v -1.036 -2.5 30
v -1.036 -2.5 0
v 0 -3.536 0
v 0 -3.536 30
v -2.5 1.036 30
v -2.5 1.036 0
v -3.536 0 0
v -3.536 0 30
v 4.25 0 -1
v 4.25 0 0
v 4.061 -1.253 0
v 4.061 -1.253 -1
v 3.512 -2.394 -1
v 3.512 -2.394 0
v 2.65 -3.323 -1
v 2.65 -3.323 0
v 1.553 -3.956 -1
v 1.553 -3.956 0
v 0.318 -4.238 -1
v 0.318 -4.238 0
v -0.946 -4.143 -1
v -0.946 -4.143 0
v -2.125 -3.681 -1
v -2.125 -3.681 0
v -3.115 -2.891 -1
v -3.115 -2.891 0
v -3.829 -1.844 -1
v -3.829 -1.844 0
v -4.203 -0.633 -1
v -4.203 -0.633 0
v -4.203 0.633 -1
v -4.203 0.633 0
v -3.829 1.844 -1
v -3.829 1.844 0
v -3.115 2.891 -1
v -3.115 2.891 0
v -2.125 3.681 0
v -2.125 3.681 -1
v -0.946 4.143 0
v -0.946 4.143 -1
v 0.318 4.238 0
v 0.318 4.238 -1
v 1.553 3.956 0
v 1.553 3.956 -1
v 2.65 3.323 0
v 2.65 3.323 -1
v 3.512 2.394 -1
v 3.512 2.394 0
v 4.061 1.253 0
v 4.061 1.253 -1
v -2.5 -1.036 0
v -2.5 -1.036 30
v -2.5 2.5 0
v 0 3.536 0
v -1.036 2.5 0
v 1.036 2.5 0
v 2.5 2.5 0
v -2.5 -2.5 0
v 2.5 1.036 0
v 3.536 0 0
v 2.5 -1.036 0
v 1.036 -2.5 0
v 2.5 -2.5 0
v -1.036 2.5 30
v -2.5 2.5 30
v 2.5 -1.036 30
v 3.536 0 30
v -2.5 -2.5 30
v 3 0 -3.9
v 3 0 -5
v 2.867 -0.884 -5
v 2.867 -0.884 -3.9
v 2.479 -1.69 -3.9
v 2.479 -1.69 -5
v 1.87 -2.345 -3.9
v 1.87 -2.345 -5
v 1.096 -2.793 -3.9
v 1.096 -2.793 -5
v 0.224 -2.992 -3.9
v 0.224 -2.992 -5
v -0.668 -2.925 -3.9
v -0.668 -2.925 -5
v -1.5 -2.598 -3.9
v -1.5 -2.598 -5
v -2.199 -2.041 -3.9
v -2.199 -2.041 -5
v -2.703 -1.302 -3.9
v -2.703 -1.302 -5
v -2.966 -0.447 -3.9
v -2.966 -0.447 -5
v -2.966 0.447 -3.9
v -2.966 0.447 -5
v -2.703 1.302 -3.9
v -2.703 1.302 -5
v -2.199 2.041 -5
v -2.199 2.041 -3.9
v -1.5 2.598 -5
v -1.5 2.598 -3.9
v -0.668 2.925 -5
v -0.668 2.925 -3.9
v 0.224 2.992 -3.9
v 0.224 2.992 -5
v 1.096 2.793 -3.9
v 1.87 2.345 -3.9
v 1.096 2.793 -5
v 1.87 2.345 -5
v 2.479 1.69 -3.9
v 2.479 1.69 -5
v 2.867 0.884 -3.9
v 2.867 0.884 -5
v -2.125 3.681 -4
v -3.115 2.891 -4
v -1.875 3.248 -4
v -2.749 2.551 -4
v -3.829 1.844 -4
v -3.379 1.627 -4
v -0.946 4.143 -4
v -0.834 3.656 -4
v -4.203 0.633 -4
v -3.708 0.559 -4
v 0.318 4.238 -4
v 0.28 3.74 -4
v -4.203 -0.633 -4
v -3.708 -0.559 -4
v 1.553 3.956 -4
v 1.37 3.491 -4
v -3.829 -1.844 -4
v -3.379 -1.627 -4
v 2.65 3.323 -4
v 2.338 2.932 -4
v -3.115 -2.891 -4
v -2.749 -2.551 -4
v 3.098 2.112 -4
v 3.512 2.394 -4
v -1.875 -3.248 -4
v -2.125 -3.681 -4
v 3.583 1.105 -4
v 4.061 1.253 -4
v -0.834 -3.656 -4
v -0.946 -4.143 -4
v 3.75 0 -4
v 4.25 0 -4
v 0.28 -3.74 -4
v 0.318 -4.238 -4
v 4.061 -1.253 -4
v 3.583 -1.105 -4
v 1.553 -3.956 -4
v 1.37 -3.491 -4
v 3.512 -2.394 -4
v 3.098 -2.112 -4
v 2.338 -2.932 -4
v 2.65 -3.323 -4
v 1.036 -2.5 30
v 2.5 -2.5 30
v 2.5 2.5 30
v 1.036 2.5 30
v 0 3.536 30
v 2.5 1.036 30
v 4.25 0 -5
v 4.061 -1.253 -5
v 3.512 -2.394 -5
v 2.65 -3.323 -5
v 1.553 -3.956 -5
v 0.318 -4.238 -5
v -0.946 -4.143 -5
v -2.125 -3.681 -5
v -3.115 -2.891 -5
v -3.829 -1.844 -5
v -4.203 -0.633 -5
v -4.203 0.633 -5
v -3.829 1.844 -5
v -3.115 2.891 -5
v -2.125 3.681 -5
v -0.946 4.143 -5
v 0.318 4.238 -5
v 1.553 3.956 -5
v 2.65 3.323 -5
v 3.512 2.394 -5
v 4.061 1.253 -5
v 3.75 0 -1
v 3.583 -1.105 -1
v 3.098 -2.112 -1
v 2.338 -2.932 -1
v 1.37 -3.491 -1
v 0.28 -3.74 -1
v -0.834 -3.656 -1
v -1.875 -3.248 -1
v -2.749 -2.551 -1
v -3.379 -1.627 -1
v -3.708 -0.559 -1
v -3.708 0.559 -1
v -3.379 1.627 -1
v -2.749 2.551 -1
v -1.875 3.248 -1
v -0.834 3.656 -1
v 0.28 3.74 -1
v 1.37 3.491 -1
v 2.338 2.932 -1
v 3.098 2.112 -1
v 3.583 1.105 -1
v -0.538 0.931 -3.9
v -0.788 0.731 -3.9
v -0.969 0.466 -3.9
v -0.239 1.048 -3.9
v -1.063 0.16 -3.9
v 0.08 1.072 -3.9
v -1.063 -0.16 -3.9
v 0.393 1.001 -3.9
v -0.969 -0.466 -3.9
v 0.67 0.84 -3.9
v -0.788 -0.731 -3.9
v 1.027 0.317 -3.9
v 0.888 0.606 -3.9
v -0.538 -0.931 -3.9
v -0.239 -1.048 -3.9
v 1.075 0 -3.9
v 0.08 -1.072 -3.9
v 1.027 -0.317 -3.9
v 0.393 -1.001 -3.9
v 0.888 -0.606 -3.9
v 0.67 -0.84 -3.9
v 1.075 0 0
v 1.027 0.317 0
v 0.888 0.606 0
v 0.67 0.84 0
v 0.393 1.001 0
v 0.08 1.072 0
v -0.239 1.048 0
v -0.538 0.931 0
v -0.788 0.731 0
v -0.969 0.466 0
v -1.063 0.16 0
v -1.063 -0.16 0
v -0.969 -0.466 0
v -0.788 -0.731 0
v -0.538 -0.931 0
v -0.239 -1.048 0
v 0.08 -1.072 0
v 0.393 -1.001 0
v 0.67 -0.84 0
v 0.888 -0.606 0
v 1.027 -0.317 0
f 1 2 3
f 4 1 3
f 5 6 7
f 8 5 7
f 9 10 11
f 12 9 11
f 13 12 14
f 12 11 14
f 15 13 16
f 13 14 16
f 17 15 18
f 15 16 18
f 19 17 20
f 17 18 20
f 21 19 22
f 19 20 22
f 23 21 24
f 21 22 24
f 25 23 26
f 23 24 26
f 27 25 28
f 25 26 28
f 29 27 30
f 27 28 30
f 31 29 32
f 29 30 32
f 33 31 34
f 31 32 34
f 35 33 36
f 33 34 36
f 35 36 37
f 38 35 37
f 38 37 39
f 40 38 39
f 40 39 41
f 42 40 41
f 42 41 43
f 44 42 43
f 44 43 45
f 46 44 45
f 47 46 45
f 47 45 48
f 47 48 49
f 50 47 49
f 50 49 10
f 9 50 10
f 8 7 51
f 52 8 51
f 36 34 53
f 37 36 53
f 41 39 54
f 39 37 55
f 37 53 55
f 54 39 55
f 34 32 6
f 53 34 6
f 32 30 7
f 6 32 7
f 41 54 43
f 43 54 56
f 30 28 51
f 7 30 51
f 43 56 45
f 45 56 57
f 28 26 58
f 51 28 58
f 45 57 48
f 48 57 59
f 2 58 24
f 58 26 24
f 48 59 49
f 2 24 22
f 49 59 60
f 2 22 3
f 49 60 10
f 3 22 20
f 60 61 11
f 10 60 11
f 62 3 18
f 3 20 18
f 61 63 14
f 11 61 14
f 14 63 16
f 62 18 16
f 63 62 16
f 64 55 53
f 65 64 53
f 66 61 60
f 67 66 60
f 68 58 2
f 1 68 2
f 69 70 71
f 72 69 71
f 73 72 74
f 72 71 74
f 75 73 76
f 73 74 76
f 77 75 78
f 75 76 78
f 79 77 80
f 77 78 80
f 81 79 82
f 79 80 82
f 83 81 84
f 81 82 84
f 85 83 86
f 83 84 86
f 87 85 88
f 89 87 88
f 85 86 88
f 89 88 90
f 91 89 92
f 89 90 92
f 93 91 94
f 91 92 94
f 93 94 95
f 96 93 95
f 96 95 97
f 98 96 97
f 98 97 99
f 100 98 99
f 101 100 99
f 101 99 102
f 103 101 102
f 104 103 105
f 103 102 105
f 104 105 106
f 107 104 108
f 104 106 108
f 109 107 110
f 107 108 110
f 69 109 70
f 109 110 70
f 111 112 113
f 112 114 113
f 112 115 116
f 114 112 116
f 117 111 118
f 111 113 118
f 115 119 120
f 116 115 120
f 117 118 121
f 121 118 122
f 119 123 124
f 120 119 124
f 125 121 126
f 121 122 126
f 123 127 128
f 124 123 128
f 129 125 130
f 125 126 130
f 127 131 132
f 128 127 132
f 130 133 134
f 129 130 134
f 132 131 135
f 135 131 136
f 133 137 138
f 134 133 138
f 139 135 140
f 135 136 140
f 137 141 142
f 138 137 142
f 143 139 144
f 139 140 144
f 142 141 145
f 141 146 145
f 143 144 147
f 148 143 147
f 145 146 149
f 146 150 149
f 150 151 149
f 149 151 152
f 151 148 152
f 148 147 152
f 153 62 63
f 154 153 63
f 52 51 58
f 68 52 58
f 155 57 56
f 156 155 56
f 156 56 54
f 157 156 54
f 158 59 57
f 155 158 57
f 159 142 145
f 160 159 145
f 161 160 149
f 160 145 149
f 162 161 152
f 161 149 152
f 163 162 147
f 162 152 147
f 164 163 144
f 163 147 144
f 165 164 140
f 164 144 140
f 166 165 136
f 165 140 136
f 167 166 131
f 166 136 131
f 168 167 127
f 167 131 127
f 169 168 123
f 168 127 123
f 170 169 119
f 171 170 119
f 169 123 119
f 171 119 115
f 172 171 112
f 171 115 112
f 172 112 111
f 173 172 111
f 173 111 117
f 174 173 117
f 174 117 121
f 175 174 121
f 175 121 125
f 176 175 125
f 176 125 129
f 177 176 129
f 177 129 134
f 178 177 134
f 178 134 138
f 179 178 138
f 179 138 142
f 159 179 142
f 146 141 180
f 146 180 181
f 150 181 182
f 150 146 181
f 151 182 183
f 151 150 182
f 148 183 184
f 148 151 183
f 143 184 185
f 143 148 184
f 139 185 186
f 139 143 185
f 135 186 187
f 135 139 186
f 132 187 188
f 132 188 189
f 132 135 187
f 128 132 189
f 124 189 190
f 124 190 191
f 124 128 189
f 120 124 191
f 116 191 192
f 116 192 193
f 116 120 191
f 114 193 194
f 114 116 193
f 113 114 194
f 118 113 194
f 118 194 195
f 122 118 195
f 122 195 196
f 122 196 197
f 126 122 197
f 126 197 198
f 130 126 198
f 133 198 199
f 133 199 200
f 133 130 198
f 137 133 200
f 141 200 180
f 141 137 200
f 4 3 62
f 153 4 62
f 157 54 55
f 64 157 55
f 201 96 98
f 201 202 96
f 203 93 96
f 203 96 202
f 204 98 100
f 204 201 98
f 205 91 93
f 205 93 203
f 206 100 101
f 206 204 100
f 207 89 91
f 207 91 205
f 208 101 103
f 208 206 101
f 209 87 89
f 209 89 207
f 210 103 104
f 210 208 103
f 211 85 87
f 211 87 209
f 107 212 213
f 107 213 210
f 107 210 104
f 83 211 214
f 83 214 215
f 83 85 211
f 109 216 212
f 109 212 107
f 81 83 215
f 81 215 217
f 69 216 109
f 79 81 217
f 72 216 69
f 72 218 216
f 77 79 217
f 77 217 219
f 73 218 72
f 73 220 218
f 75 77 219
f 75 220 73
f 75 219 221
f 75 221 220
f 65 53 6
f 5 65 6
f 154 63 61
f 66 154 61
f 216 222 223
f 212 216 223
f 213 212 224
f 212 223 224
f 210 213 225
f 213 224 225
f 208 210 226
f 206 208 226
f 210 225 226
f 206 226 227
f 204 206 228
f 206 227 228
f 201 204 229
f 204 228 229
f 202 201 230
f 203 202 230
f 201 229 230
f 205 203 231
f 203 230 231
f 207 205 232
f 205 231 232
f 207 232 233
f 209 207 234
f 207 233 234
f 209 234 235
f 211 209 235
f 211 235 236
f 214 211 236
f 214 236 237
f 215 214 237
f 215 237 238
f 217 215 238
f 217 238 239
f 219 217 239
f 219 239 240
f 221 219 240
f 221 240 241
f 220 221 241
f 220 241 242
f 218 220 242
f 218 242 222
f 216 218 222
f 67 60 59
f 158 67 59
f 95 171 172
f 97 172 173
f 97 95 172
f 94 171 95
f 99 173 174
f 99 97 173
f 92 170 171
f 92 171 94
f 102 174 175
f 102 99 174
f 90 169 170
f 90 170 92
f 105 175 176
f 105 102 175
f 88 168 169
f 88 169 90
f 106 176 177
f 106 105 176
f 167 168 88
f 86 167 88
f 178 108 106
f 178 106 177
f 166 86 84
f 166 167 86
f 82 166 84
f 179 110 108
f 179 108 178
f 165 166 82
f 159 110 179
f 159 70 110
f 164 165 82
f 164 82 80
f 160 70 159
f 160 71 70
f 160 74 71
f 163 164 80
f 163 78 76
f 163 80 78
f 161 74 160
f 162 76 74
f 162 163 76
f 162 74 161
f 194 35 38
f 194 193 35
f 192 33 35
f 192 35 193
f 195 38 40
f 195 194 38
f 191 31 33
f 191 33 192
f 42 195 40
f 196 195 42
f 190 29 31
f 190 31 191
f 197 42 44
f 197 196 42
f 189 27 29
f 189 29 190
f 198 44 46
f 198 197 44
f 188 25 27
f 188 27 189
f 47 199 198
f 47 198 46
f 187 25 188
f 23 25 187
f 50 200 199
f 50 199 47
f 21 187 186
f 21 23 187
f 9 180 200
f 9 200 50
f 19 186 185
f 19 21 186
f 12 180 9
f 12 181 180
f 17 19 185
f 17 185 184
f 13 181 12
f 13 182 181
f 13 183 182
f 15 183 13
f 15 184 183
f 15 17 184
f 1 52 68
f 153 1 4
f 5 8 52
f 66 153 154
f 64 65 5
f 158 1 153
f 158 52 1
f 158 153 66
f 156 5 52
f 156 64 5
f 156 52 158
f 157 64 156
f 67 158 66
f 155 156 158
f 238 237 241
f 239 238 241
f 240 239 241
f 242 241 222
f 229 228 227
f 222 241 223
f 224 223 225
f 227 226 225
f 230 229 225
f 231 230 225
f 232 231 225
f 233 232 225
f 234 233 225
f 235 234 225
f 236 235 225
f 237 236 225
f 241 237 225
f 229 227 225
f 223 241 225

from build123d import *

# Parameters (mm, degrees)
F1_DEPTH  = 30
F2_R      = 4.25
F3_DEPTH  = 5
F5_R      = 4.25
F5_R_2    = 3.75
F6_DEPTH  = 3
F7_R      = 1.075
F8_DEPTH  = 5
F9_R      = 3
F10_DEPTH = 1.1


with BuildPart() as f1:
    # F0 (on Top) → F1 (new body)
    with BuildSketch(Plane.XY):
        Polygon((-2.5, -1.0355339059), (-2.5, -2.5), (-1.0355339059, -2.5), align=None)
        Polygon((-2.5, -1.0355339059), (-1.0355339059, -2.5), (1.0355339059, -2.5), (2.5, -1.0355339059), (2.5, 1.0355339059), (1.0355339059, 2.5), (-1.0355339059, 2.5), (-2.5, 1.0355339059), align=None)
        Polygon((1.0355339059, -2.5), (-1.0355339059, -2.5), (0, -3.5355339059), align=None)
        Polygon((-3.5355339059, 0), (-2.5, -1.0355339059), (-2.5, 1.0355339059), align=None)
        Polygon((2.5, -1.0355339059), (1.0355339059, -2.5), (2.5, -2.5), align=None)
        Polygon((-2.5, 2.5), (-2.5, 1.0355339059), (-1.0355339059, 2.5), align=None)
        Polygon((2.5, 1.0355339059), (2.5, -1.0355339059), (3.5355339059, 0), align=None)
        Polygon((0, 3.5355339059), (-1.0355339059, 2.5), (1.0355339059, 2.5), align=None)
        Polygon((1.0355339059, 2.5), (2.5, 1.0355339059), (2.5, 2.5), align=None)
    extrude(amount=F1_DEPTH)

    # F2 (on face) → F3 (join)
    with BuildSketch(Plane(origin=(0, 0, 0), x_dir=(1, 0, 0), z_dir=(0, 0, -1))):
        Circle(F2_R)
    extrude(amount=F3_DEPTH)

    # F5 (on offset) → F6 (cut)
    with BuildSketch(Plane(origin=(0, 0, -4), x_dir=(1, 0, 0), z_dir=(0, 0, -1))):
        Circle(F5_R)
        Circle(F5_R_2, mode=Mode.SUBTRACT)
    extrude(amount=-F6_DEPTH, mode=Mode.SUBTRACT)

    # F7 (on Top) → F8 (cut)
    with BuildSketch(Plane.XY):
        Circle(F7_R)
    extrude(amount=-F8_DEPTH, mode=Mode.SUBTRACT)

    # F9 (on face) → F10 (cut)
    with BuildSketch(Plane(origin=(0, 0, -5), x_dir=(1, 0, 0), z_dir=(0, 0, -1))):
        Circle(F9_R)
    extrude(amount=-F10_DEPTH, mode=Mode.SUBTRACT)


solid = f1.part
